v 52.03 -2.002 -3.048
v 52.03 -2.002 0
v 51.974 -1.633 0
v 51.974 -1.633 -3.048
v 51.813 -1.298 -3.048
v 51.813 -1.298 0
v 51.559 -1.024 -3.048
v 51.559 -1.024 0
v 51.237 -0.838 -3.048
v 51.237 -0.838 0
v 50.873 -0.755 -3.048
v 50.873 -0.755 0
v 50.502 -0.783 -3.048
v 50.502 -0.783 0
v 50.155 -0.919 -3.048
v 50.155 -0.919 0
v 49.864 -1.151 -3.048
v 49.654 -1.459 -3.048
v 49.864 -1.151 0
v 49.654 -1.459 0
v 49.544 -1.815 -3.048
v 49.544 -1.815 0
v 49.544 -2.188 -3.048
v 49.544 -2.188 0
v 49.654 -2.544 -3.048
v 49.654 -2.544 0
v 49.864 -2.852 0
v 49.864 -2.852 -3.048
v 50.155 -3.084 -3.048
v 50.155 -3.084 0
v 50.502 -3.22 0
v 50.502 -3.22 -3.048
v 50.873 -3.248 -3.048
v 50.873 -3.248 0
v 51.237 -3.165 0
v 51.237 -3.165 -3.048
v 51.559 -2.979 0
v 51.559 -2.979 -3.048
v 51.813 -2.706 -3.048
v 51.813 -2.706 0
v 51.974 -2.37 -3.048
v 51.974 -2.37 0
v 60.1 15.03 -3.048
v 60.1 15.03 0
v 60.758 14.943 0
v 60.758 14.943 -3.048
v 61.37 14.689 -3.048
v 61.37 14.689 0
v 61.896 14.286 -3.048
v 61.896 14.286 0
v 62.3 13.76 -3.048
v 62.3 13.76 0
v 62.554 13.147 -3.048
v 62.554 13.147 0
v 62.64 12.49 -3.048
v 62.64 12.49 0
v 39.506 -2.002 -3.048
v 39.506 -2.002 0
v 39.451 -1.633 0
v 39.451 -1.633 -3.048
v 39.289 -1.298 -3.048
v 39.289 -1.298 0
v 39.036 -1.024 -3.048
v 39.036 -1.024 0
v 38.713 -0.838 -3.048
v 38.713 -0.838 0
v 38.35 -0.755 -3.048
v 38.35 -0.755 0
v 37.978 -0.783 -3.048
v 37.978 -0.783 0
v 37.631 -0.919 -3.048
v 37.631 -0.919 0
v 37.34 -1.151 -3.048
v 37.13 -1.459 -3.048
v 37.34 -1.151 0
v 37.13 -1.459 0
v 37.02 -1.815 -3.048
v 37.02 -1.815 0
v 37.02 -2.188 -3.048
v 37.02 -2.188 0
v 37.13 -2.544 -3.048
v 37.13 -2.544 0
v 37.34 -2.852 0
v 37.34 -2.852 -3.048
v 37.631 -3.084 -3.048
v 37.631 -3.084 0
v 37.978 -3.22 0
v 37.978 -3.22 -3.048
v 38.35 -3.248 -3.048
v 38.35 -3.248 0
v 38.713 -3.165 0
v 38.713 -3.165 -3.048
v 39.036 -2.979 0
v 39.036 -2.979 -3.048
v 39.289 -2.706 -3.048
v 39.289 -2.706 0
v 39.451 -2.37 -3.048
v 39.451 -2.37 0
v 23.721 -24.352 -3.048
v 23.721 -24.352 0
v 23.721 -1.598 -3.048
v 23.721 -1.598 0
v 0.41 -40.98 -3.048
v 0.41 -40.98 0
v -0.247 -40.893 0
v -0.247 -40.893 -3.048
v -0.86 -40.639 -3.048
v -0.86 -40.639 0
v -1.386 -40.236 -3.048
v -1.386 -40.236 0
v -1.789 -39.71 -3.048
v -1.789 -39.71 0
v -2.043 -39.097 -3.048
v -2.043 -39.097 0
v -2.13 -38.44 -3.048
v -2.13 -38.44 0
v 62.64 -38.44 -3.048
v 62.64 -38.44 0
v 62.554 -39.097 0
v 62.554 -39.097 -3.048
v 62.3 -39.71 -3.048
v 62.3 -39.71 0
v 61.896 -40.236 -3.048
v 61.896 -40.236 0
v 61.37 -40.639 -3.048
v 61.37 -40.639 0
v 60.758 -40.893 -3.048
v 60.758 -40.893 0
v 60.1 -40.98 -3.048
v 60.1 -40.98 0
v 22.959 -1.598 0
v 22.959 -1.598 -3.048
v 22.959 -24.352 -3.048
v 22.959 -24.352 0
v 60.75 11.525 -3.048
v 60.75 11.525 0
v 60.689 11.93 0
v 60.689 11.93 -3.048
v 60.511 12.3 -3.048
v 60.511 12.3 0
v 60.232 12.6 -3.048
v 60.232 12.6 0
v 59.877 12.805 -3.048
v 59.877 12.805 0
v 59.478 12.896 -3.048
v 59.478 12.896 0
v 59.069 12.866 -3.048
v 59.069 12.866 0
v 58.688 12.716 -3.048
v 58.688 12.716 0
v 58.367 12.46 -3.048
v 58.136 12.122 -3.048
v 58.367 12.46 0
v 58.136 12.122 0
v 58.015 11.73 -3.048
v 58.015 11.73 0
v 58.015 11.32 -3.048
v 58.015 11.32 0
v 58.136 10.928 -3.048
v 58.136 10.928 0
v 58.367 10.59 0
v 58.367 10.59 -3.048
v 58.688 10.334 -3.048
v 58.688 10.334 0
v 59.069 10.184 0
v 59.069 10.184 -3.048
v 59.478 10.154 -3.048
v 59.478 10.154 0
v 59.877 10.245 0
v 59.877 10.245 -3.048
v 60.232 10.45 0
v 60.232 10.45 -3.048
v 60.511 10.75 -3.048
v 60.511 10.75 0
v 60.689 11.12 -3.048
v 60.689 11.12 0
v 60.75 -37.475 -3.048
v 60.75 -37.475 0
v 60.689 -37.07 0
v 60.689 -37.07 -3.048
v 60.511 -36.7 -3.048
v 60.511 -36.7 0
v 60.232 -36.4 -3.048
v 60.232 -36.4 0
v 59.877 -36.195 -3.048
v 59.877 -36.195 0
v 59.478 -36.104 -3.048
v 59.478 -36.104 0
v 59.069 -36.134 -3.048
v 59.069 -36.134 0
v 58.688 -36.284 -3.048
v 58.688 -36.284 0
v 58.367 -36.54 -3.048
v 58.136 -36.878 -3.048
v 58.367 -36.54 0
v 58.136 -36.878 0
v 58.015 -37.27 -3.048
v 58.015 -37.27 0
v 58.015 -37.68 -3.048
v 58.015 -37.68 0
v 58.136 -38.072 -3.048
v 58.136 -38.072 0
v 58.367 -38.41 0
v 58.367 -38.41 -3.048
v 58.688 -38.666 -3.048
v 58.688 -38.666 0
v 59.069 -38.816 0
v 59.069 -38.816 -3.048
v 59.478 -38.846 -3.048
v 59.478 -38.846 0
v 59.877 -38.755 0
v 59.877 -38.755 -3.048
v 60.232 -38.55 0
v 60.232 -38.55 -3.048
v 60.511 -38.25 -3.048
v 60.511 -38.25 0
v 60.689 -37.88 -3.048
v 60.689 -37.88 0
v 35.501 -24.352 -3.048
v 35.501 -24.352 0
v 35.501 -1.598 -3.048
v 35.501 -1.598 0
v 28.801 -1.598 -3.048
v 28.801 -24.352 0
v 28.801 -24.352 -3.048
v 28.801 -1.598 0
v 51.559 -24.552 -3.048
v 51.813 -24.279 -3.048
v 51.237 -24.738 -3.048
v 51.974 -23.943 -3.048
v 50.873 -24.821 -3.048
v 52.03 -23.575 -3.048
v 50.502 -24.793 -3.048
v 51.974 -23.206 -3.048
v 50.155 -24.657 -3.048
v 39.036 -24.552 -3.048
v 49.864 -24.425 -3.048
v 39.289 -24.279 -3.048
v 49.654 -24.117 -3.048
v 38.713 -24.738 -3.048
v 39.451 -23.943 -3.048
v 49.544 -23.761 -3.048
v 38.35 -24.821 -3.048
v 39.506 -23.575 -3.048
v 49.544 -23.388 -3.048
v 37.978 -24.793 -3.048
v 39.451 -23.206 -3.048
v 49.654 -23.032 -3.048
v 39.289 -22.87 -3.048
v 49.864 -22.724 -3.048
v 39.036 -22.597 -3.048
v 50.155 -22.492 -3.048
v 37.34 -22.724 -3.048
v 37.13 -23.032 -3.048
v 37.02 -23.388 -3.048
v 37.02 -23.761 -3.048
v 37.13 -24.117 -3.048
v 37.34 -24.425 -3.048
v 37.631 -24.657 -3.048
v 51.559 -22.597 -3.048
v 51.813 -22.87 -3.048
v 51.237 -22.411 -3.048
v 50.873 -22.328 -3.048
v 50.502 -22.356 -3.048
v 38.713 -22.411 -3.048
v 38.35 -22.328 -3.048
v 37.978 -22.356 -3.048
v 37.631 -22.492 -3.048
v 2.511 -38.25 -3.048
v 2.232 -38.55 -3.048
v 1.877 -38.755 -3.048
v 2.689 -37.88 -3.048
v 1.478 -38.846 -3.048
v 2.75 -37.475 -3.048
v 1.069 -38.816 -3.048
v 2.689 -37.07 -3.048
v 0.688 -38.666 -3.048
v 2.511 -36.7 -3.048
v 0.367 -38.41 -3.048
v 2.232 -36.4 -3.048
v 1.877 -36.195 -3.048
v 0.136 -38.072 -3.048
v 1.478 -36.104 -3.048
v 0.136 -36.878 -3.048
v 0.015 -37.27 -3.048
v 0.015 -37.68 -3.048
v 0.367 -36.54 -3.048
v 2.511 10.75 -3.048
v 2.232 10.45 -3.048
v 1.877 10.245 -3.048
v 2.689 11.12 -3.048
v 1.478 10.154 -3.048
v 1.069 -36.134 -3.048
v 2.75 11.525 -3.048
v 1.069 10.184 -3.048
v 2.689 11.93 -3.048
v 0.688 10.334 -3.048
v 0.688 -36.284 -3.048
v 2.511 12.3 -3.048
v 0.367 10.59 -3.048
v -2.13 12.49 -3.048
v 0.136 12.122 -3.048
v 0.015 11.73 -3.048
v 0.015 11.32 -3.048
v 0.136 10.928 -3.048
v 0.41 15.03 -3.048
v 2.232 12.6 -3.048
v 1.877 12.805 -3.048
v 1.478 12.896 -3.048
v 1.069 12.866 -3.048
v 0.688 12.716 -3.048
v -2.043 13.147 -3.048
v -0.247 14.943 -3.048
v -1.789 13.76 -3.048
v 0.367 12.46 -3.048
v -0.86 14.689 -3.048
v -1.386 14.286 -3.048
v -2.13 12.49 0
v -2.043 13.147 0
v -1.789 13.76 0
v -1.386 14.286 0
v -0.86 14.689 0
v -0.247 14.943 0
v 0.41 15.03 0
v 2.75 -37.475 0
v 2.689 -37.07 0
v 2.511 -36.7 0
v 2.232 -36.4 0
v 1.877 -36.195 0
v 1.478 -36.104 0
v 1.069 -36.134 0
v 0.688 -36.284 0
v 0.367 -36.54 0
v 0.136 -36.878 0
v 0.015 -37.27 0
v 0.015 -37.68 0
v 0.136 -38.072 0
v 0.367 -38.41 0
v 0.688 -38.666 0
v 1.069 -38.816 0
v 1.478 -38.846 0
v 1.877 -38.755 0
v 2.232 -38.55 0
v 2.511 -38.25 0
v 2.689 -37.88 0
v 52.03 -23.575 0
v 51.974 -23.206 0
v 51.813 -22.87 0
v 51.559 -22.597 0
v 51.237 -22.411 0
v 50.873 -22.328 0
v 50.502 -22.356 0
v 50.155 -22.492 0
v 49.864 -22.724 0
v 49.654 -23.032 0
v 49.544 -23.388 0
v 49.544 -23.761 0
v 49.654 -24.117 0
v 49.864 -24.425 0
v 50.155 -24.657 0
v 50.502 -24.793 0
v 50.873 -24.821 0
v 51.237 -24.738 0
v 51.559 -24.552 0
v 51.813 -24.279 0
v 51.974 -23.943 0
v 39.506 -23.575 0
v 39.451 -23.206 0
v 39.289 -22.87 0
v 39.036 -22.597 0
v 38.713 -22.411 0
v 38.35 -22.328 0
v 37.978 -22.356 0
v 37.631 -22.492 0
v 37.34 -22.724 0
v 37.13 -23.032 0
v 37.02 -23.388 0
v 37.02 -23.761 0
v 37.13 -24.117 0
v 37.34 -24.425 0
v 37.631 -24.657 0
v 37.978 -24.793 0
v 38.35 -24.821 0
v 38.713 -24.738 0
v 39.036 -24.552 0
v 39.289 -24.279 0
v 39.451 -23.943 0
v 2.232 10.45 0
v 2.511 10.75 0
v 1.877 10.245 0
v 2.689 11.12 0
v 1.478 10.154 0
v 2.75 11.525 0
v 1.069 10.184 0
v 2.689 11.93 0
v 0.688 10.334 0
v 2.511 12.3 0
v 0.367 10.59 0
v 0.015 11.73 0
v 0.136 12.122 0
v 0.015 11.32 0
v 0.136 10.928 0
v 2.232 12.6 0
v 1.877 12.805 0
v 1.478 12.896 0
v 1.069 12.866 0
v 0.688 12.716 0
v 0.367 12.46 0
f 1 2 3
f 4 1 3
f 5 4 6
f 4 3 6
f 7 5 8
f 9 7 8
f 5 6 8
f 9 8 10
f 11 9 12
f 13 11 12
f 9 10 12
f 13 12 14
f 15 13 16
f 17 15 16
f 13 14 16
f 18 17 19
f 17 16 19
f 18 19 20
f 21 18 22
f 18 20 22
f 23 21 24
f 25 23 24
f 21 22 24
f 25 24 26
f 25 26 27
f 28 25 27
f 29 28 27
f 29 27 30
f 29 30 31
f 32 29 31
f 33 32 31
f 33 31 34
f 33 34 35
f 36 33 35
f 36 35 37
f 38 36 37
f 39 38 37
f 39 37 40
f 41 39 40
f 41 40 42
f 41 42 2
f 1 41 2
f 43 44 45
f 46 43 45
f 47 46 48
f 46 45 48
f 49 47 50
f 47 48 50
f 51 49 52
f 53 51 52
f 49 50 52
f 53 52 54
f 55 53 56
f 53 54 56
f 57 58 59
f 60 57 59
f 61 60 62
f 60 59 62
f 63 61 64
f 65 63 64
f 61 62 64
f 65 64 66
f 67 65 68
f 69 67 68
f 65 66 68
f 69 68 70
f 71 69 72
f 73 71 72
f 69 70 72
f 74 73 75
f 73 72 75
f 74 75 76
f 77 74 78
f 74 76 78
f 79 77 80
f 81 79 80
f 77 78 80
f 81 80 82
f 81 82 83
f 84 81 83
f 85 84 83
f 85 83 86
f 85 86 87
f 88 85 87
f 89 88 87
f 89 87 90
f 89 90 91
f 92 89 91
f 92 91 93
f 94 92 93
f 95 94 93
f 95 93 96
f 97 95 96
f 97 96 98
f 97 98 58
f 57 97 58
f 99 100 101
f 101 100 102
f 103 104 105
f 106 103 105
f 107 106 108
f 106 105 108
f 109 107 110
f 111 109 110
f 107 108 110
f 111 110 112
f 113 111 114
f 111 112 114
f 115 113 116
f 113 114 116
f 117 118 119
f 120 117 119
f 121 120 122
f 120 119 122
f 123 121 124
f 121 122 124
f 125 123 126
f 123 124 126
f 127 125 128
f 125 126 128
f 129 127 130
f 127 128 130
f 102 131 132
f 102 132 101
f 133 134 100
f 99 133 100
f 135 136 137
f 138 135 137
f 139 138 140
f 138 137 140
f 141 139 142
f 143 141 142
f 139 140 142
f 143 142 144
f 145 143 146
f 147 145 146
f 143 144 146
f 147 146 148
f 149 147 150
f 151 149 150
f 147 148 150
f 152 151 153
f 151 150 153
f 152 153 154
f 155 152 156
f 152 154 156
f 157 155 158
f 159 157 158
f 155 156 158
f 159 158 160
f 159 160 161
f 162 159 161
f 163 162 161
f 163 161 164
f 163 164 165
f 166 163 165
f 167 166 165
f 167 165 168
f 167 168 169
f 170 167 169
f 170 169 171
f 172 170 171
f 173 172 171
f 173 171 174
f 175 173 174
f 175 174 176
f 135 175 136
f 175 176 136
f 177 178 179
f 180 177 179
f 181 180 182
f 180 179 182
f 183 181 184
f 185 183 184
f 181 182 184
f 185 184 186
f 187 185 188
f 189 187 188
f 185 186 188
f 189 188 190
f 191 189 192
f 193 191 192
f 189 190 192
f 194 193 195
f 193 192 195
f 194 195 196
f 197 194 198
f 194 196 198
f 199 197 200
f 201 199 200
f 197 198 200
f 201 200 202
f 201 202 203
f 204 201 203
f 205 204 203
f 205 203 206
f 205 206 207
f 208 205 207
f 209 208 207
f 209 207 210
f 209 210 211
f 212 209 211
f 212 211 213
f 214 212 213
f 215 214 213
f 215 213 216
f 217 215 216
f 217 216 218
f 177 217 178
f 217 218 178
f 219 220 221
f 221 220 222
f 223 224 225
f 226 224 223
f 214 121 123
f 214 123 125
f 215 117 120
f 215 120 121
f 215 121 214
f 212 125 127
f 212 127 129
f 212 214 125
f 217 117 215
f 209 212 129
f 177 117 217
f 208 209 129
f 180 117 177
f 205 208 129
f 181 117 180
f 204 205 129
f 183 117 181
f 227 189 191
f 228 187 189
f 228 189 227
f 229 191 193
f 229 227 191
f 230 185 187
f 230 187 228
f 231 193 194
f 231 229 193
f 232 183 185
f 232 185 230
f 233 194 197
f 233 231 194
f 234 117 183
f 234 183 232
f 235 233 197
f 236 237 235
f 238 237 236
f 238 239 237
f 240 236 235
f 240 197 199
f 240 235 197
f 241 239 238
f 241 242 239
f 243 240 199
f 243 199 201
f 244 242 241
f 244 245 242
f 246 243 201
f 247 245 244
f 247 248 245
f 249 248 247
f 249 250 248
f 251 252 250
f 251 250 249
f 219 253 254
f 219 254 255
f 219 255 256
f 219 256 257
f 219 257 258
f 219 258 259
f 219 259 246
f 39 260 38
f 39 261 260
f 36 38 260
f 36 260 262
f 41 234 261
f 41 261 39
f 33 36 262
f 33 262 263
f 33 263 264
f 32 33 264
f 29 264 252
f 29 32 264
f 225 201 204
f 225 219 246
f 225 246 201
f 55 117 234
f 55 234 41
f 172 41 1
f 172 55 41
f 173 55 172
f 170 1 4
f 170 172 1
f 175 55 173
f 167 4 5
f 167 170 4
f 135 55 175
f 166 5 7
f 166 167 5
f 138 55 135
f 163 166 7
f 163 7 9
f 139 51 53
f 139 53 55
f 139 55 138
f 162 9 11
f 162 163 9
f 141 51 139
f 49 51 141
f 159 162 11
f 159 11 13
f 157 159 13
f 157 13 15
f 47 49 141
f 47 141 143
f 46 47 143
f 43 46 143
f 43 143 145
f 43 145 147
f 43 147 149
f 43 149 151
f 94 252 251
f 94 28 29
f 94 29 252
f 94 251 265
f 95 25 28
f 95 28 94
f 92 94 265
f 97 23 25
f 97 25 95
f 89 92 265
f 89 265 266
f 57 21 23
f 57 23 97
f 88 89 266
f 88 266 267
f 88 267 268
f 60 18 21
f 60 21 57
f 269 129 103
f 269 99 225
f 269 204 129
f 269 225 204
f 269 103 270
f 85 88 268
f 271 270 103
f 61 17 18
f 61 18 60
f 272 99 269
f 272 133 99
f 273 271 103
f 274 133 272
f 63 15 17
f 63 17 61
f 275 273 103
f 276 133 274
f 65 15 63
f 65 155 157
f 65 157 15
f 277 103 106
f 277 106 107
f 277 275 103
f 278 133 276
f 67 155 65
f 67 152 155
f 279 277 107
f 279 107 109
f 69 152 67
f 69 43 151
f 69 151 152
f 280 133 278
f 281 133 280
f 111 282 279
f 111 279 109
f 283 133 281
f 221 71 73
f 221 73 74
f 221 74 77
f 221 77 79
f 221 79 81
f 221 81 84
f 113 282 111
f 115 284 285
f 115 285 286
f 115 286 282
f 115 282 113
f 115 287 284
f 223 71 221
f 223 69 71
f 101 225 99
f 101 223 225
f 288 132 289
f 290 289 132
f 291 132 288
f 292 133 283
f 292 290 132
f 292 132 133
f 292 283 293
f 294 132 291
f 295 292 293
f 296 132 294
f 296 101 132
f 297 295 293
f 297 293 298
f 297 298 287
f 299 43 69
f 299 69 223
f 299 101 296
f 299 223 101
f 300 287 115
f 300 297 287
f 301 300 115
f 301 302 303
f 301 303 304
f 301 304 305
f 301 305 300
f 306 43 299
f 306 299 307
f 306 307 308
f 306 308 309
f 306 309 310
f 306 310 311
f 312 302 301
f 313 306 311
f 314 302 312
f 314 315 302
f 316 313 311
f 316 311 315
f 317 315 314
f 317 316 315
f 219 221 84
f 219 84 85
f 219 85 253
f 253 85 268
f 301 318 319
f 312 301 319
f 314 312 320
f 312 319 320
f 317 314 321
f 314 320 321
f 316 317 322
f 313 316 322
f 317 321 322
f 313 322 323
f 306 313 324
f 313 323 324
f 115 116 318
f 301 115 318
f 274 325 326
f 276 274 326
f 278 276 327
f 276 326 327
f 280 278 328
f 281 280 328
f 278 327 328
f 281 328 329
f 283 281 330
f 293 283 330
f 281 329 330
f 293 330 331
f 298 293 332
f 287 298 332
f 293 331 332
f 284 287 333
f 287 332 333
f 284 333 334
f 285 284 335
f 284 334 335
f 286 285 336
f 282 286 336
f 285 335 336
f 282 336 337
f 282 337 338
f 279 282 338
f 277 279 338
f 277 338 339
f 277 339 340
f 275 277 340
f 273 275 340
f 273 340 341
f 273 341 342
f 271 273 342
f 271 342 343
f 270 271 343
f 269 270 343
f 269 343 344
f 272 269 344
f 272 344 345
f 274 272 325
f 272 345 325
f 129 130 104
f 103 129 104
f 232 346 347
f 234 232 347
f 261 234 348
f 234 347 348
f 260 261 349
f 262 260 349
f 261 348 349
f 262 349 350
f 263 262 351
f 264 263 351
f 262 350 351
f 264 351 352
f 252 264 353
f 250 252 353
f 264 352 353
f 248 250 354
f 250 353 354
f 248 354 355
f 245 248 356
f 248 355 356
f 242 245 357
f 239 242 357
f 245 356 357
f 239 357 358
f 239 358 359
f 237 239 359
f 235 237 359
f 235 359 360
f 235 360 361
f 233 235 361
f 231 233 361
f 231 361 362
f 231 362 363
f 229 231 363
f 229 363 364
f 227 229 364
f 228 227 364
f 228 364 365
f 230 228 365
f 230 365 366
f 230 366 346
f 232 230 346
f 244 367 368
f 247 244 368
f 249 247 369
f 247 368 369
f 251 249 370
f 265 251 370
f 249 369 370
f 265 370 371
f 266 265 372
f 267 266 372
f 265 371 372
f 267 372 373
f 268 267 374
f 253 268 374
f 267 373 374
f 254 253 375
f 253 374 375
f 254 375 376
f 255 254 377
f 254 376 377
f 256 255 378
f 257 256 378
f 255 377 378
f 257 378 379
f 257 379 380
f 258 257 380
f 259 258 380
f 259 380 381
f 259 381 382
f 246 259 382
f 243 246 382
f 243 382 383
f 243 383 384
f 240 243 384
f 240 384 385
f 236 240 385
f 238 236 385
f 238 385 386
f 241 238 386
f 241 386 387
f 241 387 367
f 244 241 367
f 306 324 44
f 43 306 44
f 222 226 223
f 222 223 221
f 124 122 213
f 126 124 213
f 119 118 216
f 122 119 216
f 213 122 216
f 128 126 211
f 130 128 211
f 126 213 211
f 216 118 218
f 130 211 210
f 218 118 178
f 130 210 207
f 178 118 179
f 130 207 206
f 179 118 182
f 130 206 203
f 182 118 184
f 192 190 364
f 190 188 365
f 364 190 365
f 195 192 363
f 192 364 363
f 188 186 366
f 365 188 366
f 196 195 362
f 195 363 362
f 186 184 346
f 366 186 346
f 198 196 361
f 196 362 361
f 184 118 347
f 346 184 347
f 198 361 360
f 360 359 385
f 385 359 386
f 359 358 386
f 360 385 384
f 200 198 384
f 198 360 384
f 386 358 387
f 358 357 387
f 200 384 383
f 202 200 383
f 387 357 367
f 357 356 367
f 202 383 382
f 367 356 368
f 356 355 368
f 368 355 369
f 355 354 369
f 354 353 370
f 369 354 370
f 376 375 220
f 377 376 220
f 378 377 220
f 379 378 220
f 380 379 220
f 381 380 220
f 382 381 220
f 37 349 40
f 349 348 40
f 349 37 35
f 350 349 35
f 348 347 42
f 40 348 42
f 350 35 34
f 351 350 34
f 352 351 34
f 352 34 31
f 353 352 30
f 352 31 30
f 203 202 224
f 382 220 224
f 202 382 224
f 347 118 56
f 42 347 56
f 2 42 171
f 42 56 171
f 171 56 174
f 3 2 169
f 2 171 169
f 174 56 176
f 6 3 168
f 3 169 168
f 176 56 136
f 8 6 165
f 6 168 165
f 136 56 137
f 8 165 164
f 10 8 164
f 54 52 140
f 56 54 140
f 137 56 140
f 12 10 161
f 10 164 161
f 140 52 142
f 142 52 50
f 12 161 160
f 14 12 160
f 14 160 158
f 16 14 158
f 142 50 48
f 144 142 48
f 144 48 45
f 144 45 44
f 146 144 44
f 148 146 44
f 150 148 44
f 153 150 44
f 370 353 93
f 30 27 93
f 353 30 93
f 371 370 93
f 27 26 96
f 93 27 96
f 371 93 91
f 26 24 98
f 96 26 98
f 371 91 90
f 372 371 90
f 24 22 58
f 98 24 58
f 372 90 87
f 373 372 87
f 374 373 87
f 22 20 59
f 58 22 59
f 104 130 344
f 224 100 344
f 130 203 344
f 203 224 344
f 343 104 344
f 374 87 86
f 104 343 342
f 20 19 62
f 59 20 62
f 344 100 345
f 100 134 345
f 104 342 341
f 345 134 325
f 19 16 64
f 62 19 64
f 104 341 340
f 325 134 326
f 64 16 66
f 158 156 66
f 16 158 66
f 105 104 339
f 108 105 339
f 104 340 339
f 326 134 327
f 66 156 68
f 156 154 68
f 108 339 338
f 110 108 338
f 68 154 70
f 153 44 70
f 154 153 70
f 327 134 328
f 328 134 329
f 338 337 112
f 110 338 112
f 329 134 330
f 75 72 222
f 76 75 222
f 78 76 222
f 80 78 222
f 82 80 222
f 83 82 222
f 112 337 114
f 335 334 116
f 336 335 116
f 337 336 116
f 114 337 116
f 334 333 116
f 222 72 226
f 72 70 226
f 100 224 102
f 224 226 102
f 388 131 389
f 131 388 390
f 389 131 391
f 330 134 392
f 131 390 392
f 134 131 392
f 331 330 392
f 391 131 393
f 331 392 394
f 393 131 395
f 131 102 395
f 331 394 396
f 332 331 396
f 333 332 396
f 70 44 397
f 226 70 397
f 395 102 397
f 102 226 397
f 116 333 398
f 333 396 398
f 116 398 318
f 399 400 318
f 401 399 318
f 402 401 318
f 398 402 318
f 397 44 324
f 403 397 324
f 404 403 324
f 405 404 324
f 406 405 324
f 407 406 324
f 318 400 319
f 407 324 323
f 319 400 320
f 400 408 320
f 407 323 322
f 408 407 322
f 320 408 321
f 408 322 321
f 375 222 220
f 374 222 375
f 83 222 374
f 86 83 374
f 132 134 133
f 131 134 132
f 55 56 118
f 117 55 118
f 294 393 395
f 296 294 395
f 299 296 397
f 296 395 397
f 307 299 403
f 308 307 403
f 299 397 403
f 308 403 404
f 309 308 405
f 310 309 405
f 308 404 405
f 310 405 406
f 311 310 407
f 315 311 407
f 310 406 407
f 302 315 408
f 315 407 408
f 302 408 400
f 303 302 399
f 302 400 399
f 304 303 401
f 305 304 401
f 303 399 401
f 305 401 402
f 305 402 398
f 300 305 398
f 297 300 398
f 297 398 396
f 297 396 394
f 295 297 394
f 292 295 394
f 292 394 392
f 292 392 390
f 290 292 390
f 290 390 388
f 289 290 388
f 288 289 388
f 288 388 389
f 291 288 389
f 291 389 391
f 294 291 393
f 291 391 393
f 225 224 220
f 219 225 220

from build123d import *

# Parameters (mm, degrees)
SKETCH1_R           = 1.37499852
BOSS_EXTRUDE1_DEPTH = 3.048
SKETCH2_R           = 1.25
SKETCH2_W           = 6.7
SKETCH2_H           = 22.7542
SKETCH2_W_2         = 0.762
CUT_EXTRUDE1_DEPTH  = 4.048


with BuildPart() as part:
    # Sketch1 → Boss-Extrude1 (new body)
    with BuildSketch(Plane.XY):
        with BuildLine():
            Line((0.41036367, 15.02963974), (60.10036367, 15.02963974))
            ThreePointArc((60.10036367, 15.02963974), (61.896414894, 14.285690964), (62.64036367, 12.48963974))
            Line((62.64036367, 12.48963974), (62.64036367, -38.4396361))
            ThreePointArc((62.64036367, -38.4396361), (61.896414894, -40.235687324), (60.10036367, -40.9796361))
            Line((60.10036367, -40.9796361), (0.41036367, -40.9796361))
            ThreePointArc((0.41036367, -40.9796361), (-1.385687554, -40.235687324), (-2.12963633, -38.4396361))
            Line((-2.12963633, -38.4396361), (-2.12963633, 12.48963974))
            ThreePointArc((-2.12963633, 12.48963974), (-1.385687554, 14.285690964), (0.41036367, 15.02963974))
        make_face()
        with Locations((1.37500106, 11.52500108)):
            Circle(SKETCH1_R, mode=Mode.SUBTRACT)
        with Locations((59.3750019, 11.52500108)):
            Circle(SKETCH1_R, mode=Mode.SUBTRACT)
        with Locations((59.3750019, -37.47499998)):
            Circle(SKETCH1_R, mode=Mode.SUBTRACT)
        with Locations((1.37500106, -37.47499998)):
            Circle(SKETCH1_R, mode=Mode.SUBTRACT)
    extrude(amount=-BOSS_EXTRUDE1_DEPTH)

    # Sketch2 → Cut-Extrude1 (cut, through all)
    with BuildSketch(Plane.XY):
        with Locations((38.25636367, -2.00169818)):
            Circle(SKETCH2_R)
        with Locations((50.77996367, -2.00169818)):
            Circle(SKETCH2_R)
        with Locations((50.77996367, -23.57459818)):
            Circle(SKETCH2_R)
        with Locations((38.25636367, -23.57459818)):
            Circle(SKETCH2_R)
        with Locations((32.15146367, -12.97499818)):
            Rectangle(SKETCH2_W, SKETCH2_H)
        with Locations((23.34046367, -12.97499818)):
            Rectangle(SKETCH2_W_2, SKETCH2_H)
    extrude(amount=-CUT_EXTRUDE1_DEPTH, mode=Mode.SUBTRACT)


solid = part.part
